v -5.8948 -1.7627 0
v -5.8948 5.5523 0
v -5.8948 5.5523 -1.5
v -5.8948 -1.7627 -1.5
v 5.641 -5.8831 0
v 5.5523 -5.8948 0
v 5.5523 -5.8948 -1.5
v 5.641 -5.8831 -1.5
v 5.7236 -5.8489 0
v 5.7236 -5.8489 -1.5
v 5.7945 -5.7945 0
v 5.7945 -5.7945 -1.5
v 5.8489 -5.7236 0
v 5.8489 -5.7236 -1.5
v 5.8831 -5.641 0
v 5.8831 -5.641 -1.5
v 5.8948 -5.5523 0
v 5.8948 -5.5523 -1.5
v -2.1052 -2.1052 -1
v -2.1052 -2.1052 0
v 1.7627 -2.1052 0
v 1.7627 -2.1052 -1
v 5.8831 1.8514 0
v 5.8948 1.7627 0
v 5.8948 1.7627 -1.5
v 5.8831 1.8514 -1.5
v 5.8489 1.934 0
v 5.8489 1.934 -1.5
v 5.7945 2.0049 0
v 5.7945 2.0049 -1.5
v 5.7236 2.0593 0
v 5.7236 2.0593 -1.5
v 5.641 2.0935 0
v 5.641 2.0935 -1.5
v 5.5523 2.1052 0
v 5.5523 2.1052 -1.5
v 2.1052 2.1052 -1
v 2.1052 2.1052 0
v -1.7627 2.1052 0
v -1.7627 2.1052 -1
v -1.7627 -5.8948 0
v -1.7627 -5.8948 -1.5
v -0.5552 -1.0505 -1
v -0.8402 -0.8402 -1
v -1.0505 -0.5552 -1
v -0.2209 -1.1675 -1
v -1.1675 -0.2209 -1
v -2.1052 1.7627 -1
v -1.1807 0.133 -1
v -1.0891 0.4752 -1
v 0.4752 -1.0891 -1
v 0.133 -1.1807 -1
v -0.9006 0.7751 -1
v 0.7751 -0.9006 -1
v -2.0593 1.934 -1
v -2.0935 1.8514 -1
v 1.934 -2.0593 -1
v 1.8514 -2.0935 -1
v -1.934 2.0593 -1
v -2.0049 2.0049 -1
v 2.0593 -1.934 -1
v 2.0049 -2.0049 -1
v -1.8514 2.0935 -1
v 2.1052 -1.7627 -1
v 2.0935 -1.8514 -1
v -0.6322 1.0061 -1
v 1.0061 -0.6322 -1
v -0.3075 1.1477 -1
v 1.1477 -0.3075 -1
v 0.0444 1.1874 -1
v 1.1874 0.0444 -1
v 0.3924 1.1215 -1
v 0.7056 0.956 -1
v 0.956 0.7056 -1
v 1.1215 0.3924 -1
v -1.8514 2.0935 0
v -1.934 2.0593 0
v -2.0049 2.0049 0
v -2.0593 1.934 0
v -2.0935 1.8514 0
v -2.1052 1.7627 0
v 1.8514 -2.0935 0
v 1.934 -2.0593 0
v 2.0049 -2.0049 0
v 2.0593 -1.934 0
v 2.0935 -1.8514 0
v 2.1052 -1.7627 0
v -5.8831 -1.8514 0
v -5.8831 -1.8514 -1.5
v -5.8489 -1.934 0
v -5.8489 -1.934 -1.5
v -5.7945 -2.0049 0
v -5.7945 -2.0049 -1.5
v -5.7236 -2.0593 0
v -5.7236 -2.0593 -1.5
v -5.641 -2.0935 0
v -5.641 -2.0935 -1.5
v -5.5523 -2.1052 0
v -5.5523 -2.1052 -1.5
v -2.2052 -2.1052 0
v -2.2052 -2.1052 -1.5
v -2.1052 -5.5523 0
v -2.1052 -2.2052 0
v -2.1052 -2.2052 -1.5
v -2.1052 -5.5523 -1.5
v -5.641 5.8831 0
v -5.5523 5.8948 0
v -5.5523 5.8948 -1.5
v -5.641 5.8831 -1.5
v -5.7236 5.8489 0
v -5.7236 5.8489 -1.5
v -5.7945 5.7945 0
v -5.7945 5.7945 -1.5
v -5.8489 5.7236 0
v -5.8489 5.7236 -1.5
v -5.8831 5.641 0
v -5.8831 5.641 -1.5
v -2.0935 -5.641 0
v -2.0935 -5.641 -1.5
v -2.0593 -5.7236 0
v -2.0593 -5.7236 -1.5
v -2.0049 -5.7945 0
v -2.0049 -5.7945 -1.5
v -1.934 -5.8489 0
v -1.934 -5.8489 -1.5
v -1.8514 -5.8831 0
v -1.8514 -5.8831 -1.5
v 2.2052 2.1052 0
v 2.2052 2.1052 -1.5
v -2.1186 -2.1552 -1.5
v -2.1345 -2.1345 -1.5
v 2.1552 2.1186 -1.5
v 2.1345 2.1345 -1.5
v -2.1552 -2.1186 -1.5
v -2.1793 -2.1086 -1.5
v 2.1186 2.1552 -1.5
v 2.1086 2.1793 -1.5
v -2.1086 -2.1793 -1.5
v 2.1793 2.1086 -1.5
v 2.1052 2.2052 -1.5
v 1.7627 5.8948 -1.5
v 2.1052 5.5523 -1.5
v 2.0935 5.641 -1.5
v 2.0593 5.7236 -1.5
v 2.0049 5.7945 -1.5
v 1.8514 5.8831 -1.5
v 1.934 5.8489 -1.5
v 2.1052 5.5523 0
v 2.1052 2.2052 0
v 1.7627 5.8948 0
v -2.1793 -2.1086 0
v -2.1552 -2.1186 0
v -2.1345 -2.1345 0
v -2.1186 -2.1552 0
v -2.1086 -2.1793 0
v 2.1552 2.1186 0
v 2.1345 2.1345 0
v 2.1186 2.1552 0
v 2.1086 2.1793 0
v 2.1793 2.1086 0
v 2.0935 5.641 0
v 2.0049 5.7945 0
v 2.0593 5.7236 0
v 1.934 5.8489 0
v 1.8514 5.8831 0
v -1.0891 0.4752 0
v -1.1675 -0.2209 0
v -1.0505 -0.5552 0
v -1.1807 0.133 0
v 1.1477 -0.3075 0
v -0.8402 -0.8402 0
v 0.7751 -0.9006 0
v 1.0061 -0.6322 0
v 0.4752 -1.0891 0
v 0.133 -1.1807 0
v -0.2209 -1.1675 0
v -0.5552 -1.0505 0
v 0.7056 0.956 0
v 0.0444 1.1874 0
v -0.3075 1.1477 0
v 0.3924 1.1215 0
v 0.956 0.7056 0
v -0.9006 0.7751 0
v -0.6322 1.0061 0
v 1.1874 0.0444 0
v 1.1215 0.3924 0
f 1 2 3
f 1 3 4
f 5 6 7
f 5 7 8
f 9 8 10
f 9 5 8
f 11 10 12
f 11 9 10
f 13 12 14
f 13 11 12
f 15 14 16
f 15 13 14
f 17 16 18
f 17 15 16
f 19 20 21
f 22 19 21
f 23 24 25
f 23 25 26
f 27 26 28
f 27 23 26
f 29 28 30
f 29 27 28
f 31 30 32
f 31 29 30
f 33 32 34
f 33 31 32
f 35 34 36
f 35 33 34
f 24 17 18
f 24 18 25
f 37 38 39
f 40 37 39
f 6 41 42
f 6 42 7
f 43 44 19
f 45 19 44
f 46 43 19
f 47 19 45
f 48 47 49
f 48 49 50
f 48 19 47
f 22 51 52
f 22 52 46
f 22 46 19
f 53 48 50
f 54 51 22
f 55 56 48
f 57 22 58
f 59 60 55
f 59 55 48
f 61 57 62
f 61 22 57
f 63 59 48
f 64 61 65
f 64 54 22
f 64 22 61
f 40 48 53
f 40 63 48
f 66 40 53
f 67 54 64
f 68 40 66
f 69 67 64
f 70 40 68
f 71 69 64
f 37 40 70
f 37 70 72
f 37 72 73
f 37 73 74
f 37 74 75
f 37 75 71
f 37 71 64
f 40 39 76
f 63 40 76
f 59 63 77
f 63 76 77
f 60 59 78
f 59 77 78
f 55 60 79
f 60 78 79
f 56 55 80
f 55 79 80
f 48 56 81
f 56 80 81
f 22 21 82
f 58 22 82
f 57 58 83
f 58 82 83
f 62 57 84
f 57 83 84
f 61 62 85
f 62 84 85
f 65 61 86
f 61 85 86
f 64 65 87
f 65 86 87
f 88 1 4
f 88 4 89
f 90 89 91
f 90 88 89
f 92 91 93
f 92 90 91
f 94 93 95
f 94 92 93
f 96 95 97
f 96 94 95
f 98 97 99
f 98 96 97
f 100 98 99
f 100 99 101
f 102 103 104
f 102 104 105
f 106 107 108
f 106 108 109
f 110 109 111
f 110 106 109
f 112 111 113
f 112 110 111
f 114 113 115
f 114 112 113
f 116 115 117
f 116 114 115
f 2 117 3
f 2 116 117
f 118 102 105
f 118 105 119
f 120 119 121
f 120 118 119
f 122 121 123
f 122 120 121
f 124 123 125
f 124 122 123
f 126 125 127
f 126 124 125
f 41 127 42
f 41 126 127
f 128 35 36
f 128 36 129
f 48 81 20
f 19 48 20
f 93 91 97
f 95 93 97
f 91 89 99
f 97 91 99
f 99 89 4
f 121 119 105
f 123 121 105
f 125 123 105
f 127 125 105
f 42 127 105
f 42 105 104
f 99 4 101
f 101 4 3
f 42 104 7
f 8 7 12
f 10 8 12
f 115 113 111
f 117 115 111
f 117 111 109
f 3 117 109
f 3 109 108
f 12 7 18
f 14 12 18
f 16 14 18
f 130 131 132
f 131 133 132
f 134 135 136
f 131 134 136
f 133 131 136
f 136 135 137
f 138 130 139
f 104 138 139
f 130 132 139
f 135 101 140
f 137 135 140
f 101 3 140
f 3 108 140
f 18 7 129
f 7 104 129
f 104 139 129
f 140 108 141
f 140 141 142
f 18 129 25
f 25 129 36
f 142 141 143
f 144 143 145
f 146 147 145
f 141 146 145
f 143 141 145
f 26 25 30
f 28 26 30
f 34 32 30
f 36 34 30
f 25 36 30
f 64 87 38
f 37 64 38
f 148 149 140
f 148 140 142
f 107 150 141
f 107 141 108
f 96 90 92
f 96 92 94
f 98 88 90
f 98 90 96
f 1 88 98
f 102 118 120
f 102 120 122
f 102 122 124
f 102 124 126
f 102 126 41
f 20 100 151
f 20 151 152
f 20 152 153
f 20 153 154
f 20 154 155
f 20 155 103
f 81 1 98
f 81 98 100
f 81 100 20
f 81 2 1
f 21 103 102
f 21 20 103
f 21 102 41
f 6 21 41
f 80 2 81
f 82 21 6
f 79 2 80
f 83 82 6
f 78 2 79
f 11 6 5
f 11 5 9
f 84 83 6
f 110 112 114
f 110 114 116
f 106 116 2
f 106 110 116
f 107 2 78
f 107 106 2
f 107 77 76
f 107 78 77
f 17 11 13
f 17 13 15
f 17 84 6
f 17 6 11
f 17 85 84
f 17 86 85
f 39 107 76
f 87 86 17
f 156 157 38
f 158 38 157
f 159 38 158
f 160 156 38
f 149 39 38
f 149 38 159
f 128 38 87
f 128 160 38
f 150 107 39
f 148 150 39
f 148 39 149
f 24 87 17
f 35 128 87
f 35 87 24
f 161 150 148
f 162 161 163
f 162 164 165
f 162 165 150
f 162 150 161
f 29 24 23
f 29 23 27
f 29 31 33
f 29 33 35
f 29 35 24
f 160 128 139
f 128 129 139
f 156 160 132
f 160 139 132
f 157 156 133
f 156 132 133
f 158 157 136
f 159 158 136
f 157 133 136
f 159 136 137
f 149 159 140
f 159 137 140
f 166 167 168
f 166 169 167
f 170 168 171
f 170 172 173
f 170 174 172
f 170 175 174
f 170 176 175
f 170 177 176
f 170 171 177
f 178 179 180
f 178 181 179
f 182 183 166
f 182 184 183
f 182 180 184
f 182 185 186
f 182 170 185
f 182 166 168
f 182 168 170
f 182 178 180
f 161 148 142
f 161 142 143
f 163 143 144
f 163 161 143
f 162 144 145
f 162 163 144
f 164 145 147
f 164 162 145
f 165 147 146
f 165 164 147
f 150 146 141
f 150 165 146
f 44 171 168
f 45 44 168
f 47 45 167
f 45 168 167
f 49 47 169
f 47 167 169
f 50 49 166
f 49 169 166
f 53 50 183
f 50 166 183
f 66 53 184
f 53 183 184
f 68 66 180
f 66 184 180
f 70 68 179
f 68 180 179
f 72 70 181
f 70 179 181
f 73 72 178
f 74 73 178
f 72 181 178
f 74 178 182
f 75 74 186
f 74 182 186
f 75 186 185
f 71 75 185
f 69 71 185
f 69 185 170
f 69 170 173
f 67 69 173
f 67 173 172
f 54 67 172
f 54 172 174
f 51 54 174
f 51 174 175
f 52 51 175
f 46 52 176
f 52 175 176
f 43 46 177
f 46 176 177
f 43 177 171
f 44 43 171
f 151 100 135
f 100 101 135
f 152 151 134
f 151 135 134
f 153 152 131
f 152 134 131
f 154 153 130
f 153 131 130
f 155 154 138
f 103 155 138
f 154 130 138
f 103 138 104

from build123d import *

# Parameters (mm, degrees)
F1_DEPTH = 1.5
F2_R     = 0.1
F3_DEPTH = 1


with BuildPart() as f1:
    # F0 (on Top) → F1 (new body)
    with BuildSketch(Plane.XY):
        with BuildLine():
            Line((1.762745, 5.894785), (-5.552315, 5.894785))
            ThreePointArc((-5.552315, 5.894785), (-5.794478, 5.794478), (-5.894785, 5.552315))
            Line((-5.894785, 5.552315), (-5.894785, -1.762745))
            ThreePointArc((-5.894785, -1.762745), (-5.794478, -2.004908), (-5.552315, -2.105215))
            Line((-5.552315, -2.105215), (-2.105215, -2.105215))
            Line((-2.105215, -2.105215), (-2.105215, 1.762745))
            ThreePointArc((-2.105215, 1.762745), (-2.004908, 2.004908), (-1.762745, 2.105215))
            Line((-1.762745, 2.105215), (2.105215, 2.105215))
            Line((2.105215, 2.105215), (2.105215, 5.552315))
            ThreePointArc((2.105215, 5.552315), (2.004908, 5.794478), (1.762745, 5.894785))
        make_face()
        with BuildLine():
            Line((2.105215, -1.762745), (2.105215, 2.105215))
            Line((2.105215, 2.105215), (-1.762745, 2.105215))
            ThreePointArc((-1.762745, 2.105215), (-2.004908, 2.004908), (-2.105215, 1.762745))
            Line((-2.105215, 1.762745), (-2.105215, -2.105215))
            Line((-2.105215, -2.105215), (1.762745, -2.105215))
            ThreePointArc((1.762745, -2.105215), (2.004908, -2.004908), (2.105215, -1.762745))
        make_face()
        with BuildLine():
            ThreePointArc((0.840188, 0.840188), (0.840188, -0.840188), (-0.840188, -0.840188))
            ThreePointArc((-0.840188, -0.840188), (-0.840188, 0.840188), (0.840188, 0.840188))
        make_face(mode=Mode.SUBTRACT)
        with BuildLine():
            ThreePointArc((0.840188, 0.840188), (-0.840188, 0.840188), (-0.840188, -0.840188))
            ThreePointArc((-0.840188, -0.840188), (0.840188, -0.840188), (0.840188, 0.840188))
        make_face()
        with BuildLine():
            Line((5.552315, 2.105215), (2.105215, 2.105215))
            Line((2.105215, 2.105215), (2.105215, -1.762745))
            ThreePointArc((2.105215, -1.762745), (2.004908, -2.004908), (1.762745, -2.105215))
            Line((1.762745, -2.105215), (-2.105215, -2.105215))
            Line((-2.105215, -2.105215), (-2.105215, -5.552315))
            ThreePointArc((-2.105215, -5.552315), (-2.004908, -5.794478), (-1.762745, -5.894785))
            Line((-1.762745, -5.894785), (5.552315, -5.894785))
            ThreePointArc((5.552315, -5.894785), (5.794478, -5.794478), (5.894785, -5.552315))
            Line((5.894785, -5.552315), (5.894785, 1.762745))
            ThreePointArc((5.894785, 1.762745), (5.794478, 2.004908), (5.552315, 2.105215))
        make_face()
    extrude(amount=-F1_DEPTH)

    # F2
    f2_edges = [f1.edges().sort_by_distance(p)[0] for p in [
        (-2.105215, -2.105215, -0.75),
        (2.105215, 2.105215, -0.75),
    ]]
    fillet(f2_edges, radius=F2_R)

    # F0 (on Top) → F3 (cut)
    with BuildSketch(Plane.XY):
        with BuildLine():
            Line((2.105215, -1.762745), (2.105215, 2.105215))
            Line((2.105215, 2.105215), (-1.762745, 2.105215))
            ThreePointArc((-1.762745, 2.105215), (-2.004908, 2.004908), (-2.105215, 1.762745))
            Line((-2.105215, 1.762745), (-2.105215, -2.105215))
            Line((-2.105215, -2.105215), (1.762745, -2.105215))
            ThreePointArc((1.762745, -2.105215), (2.004908, -2.004908), (2.105215, -1.762745))
        make_face()
        with BuildLine():
            ThreePointArc((0.840188, 0.840188), (0.840188, -0.840188), (-0.840188, -0.840188))
            ThreePointArc((-0.840188, -0.840188), (-0.840188, 0.840188), (0.840188, 0.840188))
        make_face(mode=Mode.SUBTRACT)
    extrude(amount=-F3_DEPTH, mode=Mode.SUBTRACT)


solid = f1.part
